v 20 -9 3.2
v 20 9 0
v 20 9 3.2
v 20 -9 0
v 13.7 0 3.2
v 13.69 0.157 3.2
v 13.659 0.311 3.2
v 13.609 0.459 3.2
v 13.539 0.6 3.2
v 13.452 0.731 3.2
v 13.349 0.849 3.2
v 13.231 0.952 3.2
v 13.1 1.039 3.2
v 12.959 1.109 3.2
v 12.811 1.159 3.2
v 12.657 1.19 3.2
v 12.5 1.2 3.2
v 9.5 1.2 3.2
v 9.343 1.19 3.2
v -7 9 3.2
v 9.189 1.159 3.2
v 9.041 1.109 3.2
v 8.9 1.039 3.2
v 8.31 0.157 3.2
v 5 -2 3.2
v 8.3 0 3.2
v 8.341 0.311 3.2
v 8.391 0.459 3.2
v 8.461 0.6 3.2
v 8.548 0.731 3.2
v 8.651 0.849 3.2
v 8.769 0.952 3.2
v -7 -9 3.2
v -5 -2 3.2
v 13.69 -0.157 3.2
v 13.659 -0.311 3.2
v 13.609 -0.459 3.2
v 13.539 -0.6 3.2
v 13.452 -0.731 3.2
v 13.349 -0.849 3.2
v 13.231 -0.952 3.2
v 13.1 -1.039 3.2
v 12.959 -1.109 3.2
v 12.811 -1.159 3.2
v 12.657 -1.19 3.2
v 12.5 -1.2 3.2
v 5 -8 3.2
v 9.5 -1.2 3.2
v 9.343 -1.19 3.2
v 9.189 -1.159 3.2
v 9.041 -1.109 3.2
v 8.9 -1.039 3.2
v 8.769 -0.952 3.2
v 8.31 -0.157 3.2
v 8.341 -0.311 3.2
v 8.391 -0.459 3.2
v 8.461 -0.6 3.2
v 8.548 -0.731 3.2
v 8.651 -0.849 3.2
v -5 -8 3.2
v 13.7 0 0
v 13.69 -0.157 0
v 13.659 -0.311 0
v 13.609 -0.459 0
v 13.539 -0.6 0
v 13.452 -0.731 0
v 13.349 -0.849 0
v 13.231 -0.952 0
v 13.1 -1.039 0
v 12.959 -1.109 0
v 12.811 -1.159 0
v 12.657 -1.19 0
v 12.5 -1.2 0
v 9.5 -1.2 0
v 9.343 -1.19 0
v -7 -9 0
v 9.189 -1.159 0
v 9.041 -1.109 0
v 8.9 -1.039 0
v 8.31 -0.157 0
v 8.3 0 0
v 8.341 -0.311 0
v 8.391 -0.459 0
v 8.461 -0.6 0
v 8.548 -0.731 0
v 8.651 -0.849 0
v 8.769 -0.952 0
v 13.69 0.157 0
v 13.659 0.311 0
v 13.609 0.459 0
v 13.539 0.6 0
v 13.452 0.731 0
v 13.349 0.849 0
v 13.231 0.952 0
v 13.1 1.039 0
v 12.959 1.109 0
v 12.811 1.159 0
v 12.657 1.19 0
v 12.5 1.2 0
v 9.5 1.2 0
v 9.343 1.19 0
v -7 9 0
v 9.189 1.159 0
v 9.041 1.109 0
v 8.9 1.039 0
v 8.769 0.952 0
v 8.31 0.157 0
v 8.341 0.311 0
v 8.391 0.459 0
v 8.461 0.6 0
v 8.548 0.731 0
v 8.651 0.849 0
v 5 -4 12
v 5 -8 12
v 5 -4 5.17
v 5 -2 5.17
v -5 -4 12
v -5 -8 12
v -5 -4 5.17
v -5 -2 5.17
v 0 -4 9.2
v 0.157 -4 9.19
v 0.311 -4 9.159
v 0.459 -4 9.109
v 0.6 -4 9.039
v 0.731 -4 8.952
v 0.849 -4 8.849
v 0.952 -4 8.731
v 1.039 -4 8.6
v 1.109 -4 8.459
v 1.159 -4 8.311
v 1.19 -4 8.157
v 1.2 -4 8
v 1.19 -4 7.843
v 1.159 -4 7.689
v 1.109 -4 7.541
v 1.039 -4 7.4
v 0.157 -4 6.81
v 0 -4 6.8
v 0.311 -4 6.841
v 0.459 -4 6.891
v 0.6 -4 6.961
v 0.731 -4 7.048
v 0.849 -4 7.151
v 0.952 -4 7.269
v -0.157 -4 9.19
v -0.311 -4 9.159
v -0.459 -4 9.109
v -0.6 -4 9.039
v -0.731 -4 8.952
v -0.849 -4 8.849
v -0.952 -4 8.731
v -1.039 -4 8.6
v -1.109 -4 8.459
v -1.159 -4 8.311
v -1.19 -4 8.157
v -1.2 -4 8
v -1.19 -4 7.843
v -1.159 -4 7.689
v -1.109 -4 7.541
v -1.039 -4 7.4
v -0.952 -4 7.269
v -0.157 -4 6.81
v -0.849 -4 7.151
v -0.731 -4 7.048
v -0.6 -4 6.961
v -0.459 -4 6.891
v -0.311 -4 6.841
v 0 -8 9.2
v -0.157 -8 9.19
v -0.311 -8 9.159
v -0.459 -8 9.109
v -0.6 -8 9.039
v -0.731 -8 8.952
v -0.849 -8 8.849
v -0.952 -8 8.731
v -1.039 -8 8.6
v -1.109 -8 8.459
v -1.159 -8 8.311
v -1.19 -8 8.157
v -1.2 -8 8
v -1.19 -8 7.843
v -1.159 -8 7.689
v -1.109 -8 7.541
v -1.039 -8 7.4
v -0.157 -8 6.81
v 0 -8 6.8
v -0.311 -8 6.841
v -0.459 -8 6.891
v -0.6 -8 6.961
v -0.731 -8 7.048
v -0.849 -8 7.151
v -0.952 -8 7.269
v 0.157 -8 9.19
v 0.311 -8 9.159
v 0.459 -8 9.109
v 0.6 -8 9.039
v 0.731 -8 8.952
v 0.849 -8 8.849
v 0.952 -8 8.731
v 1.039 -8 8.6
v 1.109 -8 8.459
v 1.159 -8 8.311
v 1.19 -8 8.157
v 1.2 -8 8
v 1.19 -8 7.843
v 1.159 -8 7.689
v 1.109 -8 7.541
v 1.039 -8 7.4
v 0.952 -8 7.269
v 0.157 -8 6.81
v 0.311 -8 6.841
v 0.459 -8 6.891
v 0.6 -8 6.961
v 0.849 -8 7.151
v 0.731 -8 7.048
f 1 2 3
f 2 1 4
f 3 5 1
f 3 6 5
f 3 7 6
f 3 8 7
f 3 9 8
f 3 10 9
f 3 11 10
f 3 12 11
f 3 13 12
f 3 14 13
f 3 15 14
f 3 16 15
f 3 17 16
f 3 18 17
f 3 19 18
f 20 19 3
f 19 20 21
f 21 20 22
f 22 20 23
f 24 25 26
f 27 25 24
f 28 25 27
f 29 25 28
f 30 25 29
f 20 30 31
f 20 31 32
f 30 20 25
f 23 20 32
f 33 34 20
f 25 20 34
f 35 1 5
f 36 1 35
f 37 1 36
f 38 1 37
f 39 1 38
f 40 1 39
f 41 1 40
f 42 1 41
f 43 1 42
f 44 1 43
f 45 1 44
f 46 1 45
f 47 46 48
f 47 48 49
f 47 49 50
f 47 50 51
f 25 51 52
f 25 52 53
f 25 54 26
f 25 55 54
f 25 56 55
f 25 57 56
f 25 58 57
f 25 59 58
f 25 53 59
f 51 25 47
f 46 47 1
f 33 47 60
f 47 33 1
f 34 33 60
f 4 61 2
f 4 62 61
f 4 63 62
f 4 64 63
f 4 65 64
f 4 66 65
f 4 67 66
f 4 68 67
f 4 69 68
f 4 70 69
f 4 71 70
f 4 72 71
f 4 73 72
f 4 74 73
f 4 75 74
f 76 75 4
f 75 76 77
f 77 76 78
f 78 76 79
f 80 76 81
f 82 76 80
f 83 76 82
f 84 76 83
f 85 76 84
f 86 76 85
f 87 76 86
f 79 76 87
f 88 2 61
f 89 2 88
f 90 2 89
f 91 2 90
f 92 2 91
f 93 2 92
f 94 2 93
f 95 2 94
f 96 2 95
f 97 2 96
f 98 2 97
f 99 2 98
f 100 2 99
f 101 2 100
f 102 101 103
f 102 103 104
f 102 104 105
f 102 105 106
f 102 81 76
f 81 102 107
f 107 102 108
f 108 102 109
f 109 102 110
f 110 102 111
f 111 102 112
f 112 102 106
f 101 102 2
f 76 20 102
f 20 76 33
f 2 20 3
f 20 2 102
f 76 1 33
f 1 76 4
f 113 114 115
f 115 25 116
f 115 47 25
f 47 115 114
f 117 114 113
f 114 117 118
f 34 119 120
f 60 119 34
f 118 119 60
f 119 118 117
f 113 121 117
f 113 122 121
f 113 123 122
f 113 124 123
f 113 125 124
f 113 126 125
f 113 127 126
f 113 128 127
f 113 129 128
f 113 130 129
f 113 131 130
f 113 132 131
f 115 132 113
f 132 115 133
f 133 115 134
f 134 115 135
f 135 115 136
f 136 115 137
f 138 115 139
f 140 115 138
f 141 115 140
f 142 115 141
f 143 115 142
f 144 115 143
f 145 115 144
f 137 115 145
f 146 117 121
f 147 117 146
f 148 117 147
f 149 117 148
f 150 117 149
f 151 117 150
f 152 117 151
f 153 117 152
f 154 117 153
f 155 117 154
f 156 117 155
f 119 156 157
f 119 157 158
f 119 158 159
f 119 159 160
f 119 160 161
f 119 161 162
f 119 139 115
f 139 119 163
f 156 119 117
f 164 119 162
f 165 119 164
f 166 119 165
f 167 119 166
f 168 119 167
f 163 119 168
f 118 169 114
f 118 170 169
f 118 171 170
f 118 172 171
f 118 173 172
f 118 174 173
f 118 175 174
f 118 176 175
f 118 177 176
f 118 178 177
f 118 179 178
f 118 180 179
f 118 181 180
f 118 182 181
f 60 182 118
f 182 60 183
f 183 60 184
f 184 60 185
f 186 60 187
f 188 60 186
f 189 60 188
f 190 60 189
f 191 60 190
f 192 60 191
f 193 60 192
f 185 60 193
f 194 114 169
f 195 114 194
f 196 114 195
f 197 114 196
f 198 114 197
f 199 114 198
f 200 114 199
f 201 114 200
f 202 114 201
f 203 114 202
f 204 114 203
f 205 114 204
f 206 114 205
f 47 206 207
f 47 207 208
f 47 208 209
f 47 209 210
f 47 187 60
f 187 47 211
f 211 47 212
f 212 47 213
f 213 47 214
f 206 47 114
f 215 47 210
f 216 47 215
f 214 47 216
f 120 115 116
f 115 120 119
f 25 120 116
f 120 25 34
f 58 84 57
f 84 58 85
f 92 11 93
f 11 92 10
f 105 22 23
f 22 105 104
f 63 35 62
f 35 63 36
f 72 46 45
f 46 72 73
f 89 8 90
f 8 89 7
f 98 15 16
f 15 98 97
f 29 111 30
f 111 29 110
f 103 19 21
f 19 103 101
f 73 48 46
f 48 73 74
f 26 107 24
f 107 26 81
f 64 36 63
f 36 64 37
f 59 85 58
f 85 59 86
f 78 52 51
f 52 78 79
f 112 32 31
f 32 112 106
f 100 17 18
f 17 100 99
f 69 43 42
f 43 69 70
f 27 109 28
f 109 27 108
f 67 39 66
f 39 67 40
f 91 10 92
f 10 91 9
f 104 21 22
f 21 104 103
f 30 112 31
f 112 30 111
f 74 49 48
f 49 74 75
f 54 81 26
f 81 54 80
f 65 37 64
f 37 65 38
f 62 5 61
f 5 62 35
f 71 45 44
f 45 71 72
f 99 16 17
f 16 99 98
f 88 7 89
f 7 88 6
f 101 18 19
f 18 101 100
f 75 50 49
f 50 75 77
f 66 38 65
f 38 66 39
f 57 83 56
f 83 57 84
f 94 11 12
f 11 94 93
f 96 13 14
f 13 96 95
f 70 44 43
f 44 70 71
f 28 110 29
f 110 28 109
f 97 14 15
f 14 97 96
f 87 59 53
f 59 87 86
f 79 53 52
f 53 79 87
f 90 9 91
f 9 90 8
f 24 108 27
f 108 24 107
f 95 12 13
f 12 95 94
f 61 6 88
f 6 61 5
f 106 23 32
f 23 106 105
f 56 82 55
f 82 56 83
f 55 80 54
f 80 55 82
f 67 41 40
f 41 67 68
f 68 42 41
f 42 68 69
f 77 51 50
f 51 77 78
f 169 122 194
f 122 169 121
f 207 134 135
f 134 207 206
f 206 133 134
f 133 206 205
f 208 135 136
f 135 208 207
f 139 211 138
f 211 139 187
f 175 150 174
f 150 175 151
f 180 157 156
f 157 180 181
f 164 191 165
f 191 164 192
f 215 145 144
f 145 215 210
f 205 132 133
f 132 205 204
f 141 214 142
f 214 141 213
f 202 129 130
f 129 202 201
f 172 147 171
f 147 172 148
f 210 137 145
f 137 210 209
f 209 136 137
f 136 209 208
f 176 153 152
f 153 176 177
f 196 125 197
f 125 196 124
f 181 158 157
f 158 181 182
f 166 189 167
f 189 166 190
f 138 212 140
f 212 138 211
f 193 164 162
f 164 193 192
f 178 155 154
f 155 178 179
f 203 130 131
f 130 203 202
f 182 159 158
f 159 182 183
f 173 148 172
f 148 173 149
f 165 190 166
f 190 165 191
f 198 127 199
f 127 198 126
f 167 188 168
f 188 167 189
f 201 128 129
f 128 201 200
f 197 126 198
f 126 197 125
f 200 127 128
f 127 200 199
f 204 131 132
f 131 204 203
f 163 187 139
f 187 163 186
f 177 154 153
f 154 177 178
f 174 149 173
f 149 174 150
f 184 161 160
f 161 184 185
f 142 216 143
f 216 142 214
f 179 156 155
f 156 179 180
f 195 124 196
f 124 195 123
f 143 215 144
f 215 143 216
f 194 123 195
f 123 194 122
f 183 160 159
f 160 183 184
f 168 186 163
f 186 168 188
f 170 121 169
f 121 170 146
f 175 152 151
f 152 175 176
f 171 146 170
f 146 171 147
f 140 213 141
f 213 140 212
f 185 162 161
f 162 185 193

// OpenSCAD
// Light underside plate with existing-hole slot and projecting M2 pivot ear.
// Print plate down, upright tab up. In assembly the tab hangs under the lid.
include <../parameters.scad>

$fn = 48;
eps = 0.03;
pad_left = -7;
pad_right = 20;
pad_half_width = 9;
tab_height = 12;
tab_thickness = 4;
existing_hole_offset = lid_existing_hole_x - lid_pivot_x;

assert(existing_hole_offset > 6 && existing_hole_offset < pad_right - 3,
       "Existing hole is outside prototype lid pad");

module lid_attachment() {
    difference() {
        union() {
            translate([pad_left, -pad_half_width, 0])
                cube([pad_right - pad_left, 2 * pad_half_width, lid_pad_thickness]);
            // Tab on one side permits a washer/spacer and free rod rotation.
            translate([-5, -8, lid_pad_thickness - eps])
                cube([10, tab_thickness, tab_height - lid_pad_thickness + eps]);
            // Rounded stress relief at the tab root.
            translate([-5, -8, lid_pad_thickness - eps])
                cube([10, tab_thickness + 2, 2]);
        }
        // Oval existing-hole slot gives +/- 1.5 mm X adjustment.
        hull()
            for (x = [existing_hole_offset - 1.5, existing_hole_offset + 1.5])
                translate([x, 0, -eps])
                    cylinder(d = lid_existing_hole_d, h = lid_pad_thickness + 2 * eps);
        // Pivot axis parallel to hinge. Printed horizontal 2.4 mm hole.
        translate([0, -9, 8]) rotate([-90, 0, 0])
            cylinder(d = pivot_hole_d, h = 6);
    }
}

lid_attachment();
